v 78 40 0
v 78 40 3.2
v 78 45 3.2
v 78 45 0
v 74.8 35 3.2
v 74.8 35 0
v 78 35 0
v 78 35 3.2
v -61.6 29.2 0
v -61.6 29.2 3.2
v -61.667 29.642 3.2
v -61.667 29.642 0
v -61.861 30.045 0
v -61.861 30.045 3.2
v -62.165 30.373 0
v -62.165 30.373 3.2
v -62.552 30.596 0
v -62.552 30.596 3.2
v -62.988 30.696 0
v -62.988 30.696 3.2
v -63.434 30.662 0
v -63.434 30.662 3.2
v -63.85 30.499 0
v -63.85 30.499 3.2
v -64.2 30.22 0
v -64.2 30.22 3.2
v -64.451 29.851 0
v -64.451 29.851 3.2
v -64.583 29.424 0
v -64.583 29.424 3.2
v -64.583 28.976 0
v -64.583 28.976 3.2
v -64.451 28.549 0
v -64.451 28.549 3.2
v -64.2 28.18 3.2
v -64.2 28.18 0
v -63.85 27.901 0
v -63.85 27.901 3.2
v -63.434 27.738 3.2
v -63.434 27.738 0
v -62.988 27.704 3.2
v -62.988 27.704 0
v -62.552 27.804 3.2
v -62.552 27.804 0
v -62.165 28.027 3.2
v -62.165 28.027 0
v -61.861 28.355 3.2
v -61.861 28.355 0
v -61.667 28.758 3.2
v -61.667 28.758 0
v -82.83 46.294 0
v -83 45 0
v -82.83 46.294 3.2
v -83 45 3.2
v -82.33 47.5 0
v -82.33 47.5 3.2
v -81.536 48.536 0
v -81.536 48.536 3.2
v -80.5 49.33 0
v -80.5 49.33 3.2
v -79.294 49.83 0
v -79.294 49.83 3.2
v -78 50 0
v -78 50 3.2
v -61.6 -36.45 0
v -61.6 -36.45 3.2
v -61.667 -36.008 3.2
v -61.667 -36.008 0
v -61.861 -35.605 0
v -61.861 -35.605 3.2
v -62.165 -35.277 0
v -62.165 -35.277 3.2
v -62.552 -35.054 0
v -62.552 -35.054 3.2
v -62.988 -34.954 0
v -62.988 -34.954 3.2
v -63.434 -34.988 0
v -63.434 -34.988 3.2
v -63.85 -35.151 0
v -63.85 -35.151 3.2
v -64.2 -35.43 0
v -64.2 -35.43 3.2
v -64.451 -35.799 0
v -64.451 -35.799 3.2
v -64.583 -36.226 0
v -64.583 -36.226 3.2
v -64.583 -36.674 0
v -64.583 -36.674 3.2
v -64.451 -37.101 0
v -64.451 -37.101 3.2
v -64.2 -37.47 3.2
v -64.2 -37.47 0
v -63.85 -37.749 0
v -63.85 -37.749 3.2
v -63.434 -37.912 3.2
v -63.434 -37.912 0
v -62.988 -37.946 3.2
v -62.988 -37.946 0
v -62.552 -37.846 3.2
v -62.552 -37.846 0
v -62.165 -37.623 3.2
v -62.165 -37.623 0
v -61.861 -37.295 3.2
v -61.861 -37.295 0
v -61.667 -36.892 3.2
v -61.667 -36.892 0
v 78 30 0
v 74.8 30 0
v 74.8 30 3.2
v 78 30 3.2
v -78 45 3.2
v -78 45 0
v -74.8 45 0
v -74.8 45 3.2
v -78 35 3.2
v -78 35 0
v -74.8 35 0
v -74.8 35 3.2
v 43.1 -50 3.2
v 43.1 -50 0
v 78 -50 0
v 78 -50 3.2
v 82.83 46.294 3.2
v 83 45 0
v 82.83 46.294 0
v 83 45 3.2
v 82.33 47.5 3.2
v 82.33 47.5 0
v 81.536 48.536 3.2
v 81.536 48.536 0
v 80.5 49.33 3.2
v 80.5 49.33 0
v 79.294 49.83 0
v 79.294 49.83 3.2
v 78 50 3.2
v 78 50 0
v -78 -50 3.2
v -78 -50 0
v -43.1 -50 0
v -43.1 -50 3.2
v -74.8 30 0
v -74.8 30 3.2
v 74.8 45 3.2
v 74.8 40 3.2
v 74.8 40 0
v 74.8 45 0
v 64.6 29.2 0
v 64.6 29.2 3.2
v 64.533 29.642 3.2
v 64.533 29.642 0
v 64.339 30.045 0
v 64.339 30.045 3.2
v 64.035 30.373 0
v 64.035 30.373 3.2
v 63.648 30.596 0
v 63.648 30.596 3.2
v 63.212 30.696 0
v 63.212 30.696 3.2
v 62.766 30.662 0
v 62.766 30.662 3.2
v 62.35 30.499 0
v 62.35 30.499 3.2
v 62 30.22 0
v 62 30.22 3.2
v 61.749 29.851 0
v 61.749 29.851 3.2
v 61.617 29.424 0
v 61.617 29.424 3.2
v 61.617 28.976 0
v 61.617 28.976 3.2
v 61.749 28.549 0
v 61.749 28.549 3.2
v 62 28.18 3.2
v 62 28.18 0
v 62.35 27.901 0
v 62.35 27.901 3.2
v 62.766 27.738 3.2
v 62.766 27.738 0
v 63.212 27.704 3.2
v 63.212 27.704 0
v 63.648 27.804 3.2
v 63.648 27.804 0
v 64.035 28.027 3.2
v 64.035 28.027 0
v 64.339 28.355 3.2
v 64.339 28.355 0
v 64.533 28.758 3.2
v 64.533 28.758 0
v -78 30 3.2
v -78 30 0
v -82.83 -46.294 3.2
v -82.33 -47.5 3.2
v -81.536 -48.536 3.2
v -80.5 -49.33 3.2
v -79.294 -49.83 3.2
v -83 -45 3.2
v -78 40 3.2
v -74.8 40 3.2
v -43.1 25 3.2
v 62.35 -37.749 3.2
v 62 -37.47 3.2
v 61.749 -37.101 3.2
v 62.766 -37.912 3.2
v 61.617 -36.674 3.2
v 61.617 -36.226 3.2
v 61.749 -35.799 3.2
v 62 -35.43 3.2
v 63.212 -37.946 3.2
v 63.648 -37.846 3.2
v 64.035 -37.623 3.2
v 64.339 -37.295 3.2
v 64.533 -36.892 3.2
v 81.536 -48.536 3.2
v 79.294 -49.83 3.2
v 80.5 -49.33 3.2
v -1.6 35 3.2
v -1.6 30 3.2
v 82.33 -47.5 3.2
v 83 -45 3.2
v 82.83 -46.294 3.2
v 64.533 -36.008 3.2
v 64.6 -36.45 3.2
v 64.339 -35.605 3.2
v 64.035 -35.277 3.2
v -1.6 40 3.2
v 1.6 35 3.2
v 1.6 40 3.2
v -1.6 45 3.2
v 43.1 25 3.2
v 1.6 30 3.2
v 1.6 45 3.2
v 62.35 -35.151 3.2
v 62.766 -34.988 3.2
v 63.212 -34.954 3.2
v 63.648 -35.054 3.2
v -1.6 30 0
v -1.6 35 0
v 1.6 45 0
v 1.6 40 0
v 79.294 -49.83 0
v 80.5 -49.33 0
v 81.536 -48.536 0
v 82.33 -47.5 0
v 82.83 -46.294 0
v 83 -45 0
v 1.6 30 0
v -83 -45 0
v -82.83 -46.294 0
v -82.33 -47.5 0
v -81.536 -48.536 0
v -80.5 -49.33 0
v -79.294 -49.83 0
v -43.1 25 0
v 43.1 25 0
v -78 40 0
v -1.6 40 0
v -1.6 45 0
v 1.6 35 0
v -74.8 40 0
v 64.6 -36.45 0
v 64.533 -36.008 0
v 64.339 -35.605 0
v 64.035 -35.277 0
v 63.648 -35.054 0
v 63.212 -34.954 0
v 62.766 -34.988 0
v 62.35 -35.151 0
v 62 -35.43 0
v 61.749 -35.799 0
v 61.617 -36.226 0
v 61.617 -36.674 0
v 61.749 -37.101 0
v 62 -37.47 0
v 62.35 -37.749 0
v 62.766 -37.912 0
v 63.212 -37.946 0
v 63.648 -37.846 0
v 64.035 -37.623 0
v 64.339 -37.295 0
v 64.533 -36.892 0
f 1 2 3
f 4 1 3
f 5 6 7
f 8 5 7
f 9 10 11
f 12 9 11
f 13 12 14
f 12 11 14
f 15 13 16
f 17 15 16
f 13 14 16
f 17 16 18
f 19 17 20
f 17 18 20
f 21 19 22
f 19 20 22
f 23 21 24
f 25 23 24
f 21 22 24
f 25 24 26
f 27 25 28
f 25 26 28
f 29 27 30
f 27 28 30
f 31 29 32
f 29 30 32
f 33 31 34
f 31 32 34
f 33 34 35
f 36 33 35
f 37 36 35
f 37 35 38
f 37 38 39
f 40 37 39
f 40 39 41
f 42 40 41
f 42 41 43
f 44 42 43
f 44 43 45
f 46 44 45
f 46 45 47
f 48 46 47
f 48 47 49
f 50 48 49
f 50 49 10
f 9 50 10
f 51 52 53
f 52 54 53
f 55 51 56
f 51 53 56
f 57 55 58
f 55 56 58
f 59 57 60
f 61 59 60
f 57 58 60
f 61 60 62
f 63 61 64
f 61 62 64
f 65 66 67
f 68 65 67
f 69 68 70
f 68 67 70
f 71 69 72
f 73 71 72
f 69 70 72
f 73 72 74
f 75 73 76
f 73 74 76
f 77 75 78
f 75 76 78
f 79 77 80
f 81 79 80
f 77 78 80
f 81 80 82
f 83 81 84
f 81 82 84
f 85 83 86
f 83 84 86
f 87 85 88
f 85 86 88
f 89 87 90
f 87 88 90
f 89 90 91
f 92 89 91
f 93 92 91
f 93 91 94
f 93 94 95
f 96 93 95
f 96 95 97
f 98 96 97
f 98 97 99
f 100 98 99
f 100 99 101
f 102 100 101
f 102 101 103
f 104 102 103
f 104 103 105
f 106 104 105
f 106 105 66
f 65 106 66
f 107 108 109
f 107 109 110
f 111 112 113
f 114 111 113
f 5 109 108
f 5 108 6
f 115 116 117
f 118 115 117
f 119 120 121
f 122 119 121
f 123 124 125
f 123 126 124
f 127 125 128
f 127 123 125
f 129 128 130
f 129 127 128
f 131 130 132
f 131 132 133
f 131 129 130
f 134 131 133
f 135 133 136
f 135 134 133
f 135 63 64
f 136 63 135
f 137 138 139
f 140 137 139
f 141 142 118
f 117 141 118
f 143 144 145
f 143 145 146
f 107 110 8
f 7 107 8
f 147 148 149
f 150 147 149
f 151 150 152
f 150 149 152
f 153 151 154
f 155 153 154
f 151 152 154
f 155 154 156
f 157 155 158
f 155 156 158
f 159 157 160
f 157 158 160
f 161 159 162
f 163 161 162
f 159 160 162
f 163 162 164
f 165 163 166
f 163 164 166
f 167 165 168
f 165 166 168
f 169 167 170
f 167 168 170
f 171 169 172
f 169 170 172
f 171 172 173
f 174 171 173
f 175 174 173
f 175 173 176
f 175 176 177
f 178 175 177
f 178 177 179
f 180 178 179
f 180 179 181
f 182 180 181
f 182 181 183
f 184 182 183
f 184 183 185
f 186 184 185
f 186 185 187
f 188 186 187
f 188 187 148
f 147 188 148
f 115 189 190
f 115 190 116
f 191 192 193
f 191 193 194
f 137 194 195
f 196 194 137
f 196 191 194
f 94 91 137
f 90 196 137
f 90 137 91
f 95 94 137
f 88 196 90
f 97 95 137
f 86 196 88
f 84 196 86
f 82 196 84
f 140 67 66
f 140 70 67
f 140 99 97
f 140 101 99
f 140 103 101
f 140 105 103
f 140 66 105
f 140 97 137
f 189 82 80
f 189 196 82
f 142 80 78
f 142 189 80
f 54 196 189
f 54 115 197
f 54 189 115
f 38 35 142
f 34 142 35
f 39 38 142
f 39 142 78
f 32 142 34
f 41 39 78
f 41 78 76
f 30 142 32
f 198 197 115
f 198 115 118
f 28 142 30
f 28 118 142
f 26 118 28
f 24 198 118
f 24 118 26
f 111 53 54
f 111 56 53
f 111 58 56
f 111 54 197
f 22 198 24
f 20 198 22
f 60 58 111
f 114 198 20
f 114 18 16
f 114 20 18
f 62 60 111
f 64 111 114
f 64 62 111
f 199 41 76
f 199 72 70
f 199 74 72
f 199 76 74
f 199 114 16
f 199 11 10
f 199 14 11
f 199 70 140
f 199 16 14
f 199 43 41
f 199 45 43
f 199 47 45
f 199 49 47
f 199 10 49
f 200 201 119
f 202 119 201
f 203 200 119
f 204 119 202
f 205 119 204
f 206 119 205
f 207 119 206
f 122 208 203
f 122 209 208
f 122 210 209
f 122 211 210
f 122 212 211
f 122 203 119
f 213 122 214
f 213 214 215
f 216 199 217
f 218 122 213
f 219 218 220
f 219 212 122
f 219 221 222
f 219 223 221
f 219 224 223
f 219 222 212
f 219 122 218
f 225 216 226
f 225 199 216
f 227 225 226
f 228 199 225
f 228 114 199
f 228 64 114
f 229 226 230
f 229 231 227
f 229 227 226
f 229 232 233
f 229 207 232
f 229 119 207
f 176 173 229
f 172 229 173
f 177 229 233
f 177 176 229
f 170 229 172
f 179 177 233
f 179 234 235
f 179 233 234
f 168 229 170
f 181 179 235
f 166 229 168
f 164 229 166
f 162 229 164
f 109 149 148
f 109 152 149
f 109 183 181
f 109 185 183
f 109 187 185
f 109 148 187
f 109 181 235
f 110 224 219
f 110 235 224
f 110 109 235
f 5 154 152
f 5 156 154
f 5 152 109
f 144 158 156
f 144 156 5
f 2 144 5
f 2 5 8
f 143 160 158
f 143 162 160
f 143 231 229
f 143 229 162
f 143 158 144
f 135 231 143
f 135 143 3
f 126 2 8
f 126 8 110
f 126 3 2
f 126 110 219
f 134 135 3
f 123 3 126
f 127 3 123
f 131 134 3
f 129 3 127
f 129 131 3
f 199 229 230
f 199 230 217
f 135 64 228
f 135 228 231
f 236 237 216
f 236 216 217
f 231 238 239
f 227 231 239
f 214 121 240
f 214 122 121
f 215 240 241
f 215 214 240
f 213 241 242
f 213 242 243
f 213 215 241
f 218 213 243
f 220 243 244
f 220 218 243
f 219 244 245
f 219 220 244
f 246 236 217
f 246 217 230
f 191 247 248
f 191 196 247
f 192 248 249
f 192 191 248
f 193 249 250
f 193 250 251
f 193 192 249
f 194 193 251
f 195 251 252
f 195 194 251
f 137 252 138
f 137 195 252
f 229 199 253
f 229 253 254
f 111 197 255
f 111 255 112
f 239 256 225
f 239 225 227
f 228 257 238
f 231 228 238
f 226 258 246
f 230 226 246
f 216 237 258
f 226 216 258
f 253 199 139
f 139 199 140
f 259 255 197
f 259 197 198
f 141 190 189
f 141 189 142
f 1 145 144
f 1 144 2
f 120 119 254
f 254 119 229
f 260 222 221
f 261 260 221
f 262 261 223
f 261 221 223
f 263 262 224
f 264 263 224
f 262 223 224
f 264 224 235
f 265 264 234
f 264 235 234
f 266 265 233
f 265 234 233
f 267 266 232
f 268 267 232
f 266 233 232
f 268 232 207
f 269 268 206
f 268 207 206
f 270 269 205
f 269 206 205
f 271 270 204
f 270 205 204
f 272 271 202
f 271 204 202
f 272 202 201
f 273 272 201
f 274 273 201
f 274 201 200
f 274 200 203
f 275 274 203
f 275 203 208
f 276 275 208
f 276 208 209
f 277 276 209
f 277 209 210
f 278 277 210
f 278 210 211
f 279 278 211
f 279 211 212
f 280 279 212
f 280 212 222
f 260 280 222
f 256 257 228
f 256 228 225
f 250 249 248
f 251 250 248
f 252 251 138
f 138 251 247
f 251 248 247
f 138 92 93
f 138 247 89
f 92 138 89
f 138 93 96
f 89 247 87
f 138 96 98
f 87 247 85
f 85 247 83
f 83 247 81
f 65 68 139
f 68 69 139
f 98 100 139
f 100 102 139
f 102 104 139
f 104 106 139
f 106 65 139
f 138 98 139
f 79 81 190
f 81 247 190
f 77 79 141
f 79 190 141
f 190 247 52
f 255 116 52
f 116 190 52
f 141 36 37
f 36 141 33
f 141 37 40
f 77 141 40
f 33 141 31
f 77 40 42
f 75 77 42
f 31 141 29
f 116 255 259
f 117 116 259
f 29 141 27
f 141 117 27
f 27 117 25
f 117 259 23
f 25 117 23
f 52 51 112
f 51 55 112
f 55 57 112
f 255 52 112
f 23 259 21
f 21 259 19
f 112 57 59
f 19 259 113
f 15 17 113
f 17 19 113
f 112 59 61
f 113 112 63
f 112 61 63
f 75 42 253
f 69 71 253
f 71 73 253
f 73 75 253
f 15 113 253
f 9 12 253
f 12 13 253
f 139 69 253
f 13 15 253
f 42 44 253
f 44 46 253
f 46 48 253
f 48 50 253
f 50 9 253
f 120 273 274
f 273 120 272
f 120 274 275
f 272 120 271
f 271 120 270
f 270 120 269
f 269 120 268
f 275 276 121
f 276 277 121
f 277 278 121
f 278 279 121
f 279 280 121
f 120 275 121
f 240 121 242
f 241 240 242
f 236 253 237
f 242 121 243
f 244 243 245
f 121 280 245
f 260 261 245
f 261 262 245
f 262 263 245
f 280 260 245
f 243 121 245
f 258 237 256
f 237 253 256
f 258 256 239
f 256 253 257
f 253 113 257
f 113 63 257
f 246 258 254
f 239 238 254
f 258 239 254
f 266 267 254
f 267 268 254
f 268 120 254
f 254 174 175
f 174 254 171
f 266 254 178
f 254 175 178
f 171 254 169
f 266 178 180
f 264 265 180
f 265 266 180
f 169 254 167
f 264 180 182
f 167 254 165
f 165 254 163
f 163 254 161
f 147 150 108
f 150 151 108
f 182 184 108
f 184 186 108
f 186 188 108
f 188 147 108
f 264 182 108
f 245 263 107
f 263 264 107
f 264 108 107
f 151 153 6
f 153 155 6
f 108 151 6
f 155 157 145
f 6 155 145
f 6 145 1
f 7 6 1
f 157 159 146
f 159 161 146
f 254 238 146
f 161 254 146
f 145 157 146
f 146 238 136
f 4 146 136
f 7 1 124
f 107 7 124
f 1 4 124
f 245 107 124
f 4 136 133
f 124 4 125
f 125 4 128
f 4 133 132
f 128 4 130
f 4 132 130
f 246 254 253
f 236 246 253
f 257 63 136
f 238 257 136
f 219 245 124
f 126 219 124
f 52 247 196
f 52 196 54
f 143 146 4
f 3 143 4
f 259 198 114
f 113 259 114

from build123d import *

# Parameters (mm, degrees)
F0_W      = 166
F0_H      = 100
F1_DEPTH  = 3.2
F2_R      = 5
F3_R      = 1.5
F4_DEPTH  = 25
F6_DEPTH  = 25
F7_W      = 3.2
F7_H      = 5
F8_DEPTH  = 25
F9_W      = 86.2
F9_H      = 5
F10_DEPTH = 3.2
F11_W     = 3.2
F11_H     = 5
F12_DEPTH = 25


with BuildPart() as f1:
    # F0 (on Top) → F1 (new body)
    with BuildSketch(Plane.XY):
        Rectangle(F0_W, F0_H)
    extrude(amount=F1_DEPTH)

    # F2
    f2_edges = [f1.edges().sort_by_distance(p)[0] for p in [
        (83, 50, 1.6),
        (83, -50, 1.6),
        (-83, -50, 1.6),
        (-83, 50, 1.6),
    ]]
    fillet(f2_edges, radius=F2_R)

    # F3 (on face) → F4 (cut)
    with BuildSketch(Plane.XY.offset(3.2)):
        with Locations((63.1, 29.2)):
            Circle(F3_R)
        with Locations((-63.1, 29.2)):
            Circle(F3_R)
        with Locations((-63.1, -36.45)):
            Circle(F3_R)
        with Locations((63.1, -36.45)):
            Circle(F3_R)
    extrude(amount=-F4_DEPTH, mode=Mode.SUBTRACT)

    # F5 (on face) → F6 (cut)
    with BuildSketch(Plane.XY.offset(3.2)):
        Polygon((43.1, 30), (0, 30), (-43.1, 30), (-43.1, -50), (43.1, -50), align=None)
    extrude(amount=-F6_DEPTH, mode=Mode.SUBTRACT)

    # F7 (on face) → F8 (cut)
    with BuildSketch(Plane.XY.offset(3.2)):
        with Locations((-76.4, 42.5)):
            Rectangle(F7_W, F7_H)
        with Locations((-76.4, 32.5)):
            Rectangle(F7_W, F7_H)
        with Locations((76.4, 32.5)):
            Rectangle(F7_W, F7_H)
        with Locations((76.4, 42.5)):
            Rectangle(F7_W, F7_H)
    extrude(amount=-F8_DEPTH, mode=Mode.SUBTRACT)

    # F9 (on face) → F10 (join, through all)
    with BuildSketch(Plane.XY.offset(3.2)):
        with Locations((0, 27.5)):
            Rectangle(F9_W, F9_H)
    extrude(amount=-F10_DEPTH)

    # F11 (on face) → F12 (cut)
    with BuildSketch(Plane(origin=(0, 0, 0), x_dir=(1, 0, 0), z_dir=(0, 0, -1))):
        with Locations((0, -32.5)):
            Rectangle(F11_W, F11_H)
        with Locations((0, -42.5)):
            Rectangle(F11_W, F11_H)
    extrude(amount=-F12_DEPTH, mode=Mode.SUBTRACT)


solid = f1.part
